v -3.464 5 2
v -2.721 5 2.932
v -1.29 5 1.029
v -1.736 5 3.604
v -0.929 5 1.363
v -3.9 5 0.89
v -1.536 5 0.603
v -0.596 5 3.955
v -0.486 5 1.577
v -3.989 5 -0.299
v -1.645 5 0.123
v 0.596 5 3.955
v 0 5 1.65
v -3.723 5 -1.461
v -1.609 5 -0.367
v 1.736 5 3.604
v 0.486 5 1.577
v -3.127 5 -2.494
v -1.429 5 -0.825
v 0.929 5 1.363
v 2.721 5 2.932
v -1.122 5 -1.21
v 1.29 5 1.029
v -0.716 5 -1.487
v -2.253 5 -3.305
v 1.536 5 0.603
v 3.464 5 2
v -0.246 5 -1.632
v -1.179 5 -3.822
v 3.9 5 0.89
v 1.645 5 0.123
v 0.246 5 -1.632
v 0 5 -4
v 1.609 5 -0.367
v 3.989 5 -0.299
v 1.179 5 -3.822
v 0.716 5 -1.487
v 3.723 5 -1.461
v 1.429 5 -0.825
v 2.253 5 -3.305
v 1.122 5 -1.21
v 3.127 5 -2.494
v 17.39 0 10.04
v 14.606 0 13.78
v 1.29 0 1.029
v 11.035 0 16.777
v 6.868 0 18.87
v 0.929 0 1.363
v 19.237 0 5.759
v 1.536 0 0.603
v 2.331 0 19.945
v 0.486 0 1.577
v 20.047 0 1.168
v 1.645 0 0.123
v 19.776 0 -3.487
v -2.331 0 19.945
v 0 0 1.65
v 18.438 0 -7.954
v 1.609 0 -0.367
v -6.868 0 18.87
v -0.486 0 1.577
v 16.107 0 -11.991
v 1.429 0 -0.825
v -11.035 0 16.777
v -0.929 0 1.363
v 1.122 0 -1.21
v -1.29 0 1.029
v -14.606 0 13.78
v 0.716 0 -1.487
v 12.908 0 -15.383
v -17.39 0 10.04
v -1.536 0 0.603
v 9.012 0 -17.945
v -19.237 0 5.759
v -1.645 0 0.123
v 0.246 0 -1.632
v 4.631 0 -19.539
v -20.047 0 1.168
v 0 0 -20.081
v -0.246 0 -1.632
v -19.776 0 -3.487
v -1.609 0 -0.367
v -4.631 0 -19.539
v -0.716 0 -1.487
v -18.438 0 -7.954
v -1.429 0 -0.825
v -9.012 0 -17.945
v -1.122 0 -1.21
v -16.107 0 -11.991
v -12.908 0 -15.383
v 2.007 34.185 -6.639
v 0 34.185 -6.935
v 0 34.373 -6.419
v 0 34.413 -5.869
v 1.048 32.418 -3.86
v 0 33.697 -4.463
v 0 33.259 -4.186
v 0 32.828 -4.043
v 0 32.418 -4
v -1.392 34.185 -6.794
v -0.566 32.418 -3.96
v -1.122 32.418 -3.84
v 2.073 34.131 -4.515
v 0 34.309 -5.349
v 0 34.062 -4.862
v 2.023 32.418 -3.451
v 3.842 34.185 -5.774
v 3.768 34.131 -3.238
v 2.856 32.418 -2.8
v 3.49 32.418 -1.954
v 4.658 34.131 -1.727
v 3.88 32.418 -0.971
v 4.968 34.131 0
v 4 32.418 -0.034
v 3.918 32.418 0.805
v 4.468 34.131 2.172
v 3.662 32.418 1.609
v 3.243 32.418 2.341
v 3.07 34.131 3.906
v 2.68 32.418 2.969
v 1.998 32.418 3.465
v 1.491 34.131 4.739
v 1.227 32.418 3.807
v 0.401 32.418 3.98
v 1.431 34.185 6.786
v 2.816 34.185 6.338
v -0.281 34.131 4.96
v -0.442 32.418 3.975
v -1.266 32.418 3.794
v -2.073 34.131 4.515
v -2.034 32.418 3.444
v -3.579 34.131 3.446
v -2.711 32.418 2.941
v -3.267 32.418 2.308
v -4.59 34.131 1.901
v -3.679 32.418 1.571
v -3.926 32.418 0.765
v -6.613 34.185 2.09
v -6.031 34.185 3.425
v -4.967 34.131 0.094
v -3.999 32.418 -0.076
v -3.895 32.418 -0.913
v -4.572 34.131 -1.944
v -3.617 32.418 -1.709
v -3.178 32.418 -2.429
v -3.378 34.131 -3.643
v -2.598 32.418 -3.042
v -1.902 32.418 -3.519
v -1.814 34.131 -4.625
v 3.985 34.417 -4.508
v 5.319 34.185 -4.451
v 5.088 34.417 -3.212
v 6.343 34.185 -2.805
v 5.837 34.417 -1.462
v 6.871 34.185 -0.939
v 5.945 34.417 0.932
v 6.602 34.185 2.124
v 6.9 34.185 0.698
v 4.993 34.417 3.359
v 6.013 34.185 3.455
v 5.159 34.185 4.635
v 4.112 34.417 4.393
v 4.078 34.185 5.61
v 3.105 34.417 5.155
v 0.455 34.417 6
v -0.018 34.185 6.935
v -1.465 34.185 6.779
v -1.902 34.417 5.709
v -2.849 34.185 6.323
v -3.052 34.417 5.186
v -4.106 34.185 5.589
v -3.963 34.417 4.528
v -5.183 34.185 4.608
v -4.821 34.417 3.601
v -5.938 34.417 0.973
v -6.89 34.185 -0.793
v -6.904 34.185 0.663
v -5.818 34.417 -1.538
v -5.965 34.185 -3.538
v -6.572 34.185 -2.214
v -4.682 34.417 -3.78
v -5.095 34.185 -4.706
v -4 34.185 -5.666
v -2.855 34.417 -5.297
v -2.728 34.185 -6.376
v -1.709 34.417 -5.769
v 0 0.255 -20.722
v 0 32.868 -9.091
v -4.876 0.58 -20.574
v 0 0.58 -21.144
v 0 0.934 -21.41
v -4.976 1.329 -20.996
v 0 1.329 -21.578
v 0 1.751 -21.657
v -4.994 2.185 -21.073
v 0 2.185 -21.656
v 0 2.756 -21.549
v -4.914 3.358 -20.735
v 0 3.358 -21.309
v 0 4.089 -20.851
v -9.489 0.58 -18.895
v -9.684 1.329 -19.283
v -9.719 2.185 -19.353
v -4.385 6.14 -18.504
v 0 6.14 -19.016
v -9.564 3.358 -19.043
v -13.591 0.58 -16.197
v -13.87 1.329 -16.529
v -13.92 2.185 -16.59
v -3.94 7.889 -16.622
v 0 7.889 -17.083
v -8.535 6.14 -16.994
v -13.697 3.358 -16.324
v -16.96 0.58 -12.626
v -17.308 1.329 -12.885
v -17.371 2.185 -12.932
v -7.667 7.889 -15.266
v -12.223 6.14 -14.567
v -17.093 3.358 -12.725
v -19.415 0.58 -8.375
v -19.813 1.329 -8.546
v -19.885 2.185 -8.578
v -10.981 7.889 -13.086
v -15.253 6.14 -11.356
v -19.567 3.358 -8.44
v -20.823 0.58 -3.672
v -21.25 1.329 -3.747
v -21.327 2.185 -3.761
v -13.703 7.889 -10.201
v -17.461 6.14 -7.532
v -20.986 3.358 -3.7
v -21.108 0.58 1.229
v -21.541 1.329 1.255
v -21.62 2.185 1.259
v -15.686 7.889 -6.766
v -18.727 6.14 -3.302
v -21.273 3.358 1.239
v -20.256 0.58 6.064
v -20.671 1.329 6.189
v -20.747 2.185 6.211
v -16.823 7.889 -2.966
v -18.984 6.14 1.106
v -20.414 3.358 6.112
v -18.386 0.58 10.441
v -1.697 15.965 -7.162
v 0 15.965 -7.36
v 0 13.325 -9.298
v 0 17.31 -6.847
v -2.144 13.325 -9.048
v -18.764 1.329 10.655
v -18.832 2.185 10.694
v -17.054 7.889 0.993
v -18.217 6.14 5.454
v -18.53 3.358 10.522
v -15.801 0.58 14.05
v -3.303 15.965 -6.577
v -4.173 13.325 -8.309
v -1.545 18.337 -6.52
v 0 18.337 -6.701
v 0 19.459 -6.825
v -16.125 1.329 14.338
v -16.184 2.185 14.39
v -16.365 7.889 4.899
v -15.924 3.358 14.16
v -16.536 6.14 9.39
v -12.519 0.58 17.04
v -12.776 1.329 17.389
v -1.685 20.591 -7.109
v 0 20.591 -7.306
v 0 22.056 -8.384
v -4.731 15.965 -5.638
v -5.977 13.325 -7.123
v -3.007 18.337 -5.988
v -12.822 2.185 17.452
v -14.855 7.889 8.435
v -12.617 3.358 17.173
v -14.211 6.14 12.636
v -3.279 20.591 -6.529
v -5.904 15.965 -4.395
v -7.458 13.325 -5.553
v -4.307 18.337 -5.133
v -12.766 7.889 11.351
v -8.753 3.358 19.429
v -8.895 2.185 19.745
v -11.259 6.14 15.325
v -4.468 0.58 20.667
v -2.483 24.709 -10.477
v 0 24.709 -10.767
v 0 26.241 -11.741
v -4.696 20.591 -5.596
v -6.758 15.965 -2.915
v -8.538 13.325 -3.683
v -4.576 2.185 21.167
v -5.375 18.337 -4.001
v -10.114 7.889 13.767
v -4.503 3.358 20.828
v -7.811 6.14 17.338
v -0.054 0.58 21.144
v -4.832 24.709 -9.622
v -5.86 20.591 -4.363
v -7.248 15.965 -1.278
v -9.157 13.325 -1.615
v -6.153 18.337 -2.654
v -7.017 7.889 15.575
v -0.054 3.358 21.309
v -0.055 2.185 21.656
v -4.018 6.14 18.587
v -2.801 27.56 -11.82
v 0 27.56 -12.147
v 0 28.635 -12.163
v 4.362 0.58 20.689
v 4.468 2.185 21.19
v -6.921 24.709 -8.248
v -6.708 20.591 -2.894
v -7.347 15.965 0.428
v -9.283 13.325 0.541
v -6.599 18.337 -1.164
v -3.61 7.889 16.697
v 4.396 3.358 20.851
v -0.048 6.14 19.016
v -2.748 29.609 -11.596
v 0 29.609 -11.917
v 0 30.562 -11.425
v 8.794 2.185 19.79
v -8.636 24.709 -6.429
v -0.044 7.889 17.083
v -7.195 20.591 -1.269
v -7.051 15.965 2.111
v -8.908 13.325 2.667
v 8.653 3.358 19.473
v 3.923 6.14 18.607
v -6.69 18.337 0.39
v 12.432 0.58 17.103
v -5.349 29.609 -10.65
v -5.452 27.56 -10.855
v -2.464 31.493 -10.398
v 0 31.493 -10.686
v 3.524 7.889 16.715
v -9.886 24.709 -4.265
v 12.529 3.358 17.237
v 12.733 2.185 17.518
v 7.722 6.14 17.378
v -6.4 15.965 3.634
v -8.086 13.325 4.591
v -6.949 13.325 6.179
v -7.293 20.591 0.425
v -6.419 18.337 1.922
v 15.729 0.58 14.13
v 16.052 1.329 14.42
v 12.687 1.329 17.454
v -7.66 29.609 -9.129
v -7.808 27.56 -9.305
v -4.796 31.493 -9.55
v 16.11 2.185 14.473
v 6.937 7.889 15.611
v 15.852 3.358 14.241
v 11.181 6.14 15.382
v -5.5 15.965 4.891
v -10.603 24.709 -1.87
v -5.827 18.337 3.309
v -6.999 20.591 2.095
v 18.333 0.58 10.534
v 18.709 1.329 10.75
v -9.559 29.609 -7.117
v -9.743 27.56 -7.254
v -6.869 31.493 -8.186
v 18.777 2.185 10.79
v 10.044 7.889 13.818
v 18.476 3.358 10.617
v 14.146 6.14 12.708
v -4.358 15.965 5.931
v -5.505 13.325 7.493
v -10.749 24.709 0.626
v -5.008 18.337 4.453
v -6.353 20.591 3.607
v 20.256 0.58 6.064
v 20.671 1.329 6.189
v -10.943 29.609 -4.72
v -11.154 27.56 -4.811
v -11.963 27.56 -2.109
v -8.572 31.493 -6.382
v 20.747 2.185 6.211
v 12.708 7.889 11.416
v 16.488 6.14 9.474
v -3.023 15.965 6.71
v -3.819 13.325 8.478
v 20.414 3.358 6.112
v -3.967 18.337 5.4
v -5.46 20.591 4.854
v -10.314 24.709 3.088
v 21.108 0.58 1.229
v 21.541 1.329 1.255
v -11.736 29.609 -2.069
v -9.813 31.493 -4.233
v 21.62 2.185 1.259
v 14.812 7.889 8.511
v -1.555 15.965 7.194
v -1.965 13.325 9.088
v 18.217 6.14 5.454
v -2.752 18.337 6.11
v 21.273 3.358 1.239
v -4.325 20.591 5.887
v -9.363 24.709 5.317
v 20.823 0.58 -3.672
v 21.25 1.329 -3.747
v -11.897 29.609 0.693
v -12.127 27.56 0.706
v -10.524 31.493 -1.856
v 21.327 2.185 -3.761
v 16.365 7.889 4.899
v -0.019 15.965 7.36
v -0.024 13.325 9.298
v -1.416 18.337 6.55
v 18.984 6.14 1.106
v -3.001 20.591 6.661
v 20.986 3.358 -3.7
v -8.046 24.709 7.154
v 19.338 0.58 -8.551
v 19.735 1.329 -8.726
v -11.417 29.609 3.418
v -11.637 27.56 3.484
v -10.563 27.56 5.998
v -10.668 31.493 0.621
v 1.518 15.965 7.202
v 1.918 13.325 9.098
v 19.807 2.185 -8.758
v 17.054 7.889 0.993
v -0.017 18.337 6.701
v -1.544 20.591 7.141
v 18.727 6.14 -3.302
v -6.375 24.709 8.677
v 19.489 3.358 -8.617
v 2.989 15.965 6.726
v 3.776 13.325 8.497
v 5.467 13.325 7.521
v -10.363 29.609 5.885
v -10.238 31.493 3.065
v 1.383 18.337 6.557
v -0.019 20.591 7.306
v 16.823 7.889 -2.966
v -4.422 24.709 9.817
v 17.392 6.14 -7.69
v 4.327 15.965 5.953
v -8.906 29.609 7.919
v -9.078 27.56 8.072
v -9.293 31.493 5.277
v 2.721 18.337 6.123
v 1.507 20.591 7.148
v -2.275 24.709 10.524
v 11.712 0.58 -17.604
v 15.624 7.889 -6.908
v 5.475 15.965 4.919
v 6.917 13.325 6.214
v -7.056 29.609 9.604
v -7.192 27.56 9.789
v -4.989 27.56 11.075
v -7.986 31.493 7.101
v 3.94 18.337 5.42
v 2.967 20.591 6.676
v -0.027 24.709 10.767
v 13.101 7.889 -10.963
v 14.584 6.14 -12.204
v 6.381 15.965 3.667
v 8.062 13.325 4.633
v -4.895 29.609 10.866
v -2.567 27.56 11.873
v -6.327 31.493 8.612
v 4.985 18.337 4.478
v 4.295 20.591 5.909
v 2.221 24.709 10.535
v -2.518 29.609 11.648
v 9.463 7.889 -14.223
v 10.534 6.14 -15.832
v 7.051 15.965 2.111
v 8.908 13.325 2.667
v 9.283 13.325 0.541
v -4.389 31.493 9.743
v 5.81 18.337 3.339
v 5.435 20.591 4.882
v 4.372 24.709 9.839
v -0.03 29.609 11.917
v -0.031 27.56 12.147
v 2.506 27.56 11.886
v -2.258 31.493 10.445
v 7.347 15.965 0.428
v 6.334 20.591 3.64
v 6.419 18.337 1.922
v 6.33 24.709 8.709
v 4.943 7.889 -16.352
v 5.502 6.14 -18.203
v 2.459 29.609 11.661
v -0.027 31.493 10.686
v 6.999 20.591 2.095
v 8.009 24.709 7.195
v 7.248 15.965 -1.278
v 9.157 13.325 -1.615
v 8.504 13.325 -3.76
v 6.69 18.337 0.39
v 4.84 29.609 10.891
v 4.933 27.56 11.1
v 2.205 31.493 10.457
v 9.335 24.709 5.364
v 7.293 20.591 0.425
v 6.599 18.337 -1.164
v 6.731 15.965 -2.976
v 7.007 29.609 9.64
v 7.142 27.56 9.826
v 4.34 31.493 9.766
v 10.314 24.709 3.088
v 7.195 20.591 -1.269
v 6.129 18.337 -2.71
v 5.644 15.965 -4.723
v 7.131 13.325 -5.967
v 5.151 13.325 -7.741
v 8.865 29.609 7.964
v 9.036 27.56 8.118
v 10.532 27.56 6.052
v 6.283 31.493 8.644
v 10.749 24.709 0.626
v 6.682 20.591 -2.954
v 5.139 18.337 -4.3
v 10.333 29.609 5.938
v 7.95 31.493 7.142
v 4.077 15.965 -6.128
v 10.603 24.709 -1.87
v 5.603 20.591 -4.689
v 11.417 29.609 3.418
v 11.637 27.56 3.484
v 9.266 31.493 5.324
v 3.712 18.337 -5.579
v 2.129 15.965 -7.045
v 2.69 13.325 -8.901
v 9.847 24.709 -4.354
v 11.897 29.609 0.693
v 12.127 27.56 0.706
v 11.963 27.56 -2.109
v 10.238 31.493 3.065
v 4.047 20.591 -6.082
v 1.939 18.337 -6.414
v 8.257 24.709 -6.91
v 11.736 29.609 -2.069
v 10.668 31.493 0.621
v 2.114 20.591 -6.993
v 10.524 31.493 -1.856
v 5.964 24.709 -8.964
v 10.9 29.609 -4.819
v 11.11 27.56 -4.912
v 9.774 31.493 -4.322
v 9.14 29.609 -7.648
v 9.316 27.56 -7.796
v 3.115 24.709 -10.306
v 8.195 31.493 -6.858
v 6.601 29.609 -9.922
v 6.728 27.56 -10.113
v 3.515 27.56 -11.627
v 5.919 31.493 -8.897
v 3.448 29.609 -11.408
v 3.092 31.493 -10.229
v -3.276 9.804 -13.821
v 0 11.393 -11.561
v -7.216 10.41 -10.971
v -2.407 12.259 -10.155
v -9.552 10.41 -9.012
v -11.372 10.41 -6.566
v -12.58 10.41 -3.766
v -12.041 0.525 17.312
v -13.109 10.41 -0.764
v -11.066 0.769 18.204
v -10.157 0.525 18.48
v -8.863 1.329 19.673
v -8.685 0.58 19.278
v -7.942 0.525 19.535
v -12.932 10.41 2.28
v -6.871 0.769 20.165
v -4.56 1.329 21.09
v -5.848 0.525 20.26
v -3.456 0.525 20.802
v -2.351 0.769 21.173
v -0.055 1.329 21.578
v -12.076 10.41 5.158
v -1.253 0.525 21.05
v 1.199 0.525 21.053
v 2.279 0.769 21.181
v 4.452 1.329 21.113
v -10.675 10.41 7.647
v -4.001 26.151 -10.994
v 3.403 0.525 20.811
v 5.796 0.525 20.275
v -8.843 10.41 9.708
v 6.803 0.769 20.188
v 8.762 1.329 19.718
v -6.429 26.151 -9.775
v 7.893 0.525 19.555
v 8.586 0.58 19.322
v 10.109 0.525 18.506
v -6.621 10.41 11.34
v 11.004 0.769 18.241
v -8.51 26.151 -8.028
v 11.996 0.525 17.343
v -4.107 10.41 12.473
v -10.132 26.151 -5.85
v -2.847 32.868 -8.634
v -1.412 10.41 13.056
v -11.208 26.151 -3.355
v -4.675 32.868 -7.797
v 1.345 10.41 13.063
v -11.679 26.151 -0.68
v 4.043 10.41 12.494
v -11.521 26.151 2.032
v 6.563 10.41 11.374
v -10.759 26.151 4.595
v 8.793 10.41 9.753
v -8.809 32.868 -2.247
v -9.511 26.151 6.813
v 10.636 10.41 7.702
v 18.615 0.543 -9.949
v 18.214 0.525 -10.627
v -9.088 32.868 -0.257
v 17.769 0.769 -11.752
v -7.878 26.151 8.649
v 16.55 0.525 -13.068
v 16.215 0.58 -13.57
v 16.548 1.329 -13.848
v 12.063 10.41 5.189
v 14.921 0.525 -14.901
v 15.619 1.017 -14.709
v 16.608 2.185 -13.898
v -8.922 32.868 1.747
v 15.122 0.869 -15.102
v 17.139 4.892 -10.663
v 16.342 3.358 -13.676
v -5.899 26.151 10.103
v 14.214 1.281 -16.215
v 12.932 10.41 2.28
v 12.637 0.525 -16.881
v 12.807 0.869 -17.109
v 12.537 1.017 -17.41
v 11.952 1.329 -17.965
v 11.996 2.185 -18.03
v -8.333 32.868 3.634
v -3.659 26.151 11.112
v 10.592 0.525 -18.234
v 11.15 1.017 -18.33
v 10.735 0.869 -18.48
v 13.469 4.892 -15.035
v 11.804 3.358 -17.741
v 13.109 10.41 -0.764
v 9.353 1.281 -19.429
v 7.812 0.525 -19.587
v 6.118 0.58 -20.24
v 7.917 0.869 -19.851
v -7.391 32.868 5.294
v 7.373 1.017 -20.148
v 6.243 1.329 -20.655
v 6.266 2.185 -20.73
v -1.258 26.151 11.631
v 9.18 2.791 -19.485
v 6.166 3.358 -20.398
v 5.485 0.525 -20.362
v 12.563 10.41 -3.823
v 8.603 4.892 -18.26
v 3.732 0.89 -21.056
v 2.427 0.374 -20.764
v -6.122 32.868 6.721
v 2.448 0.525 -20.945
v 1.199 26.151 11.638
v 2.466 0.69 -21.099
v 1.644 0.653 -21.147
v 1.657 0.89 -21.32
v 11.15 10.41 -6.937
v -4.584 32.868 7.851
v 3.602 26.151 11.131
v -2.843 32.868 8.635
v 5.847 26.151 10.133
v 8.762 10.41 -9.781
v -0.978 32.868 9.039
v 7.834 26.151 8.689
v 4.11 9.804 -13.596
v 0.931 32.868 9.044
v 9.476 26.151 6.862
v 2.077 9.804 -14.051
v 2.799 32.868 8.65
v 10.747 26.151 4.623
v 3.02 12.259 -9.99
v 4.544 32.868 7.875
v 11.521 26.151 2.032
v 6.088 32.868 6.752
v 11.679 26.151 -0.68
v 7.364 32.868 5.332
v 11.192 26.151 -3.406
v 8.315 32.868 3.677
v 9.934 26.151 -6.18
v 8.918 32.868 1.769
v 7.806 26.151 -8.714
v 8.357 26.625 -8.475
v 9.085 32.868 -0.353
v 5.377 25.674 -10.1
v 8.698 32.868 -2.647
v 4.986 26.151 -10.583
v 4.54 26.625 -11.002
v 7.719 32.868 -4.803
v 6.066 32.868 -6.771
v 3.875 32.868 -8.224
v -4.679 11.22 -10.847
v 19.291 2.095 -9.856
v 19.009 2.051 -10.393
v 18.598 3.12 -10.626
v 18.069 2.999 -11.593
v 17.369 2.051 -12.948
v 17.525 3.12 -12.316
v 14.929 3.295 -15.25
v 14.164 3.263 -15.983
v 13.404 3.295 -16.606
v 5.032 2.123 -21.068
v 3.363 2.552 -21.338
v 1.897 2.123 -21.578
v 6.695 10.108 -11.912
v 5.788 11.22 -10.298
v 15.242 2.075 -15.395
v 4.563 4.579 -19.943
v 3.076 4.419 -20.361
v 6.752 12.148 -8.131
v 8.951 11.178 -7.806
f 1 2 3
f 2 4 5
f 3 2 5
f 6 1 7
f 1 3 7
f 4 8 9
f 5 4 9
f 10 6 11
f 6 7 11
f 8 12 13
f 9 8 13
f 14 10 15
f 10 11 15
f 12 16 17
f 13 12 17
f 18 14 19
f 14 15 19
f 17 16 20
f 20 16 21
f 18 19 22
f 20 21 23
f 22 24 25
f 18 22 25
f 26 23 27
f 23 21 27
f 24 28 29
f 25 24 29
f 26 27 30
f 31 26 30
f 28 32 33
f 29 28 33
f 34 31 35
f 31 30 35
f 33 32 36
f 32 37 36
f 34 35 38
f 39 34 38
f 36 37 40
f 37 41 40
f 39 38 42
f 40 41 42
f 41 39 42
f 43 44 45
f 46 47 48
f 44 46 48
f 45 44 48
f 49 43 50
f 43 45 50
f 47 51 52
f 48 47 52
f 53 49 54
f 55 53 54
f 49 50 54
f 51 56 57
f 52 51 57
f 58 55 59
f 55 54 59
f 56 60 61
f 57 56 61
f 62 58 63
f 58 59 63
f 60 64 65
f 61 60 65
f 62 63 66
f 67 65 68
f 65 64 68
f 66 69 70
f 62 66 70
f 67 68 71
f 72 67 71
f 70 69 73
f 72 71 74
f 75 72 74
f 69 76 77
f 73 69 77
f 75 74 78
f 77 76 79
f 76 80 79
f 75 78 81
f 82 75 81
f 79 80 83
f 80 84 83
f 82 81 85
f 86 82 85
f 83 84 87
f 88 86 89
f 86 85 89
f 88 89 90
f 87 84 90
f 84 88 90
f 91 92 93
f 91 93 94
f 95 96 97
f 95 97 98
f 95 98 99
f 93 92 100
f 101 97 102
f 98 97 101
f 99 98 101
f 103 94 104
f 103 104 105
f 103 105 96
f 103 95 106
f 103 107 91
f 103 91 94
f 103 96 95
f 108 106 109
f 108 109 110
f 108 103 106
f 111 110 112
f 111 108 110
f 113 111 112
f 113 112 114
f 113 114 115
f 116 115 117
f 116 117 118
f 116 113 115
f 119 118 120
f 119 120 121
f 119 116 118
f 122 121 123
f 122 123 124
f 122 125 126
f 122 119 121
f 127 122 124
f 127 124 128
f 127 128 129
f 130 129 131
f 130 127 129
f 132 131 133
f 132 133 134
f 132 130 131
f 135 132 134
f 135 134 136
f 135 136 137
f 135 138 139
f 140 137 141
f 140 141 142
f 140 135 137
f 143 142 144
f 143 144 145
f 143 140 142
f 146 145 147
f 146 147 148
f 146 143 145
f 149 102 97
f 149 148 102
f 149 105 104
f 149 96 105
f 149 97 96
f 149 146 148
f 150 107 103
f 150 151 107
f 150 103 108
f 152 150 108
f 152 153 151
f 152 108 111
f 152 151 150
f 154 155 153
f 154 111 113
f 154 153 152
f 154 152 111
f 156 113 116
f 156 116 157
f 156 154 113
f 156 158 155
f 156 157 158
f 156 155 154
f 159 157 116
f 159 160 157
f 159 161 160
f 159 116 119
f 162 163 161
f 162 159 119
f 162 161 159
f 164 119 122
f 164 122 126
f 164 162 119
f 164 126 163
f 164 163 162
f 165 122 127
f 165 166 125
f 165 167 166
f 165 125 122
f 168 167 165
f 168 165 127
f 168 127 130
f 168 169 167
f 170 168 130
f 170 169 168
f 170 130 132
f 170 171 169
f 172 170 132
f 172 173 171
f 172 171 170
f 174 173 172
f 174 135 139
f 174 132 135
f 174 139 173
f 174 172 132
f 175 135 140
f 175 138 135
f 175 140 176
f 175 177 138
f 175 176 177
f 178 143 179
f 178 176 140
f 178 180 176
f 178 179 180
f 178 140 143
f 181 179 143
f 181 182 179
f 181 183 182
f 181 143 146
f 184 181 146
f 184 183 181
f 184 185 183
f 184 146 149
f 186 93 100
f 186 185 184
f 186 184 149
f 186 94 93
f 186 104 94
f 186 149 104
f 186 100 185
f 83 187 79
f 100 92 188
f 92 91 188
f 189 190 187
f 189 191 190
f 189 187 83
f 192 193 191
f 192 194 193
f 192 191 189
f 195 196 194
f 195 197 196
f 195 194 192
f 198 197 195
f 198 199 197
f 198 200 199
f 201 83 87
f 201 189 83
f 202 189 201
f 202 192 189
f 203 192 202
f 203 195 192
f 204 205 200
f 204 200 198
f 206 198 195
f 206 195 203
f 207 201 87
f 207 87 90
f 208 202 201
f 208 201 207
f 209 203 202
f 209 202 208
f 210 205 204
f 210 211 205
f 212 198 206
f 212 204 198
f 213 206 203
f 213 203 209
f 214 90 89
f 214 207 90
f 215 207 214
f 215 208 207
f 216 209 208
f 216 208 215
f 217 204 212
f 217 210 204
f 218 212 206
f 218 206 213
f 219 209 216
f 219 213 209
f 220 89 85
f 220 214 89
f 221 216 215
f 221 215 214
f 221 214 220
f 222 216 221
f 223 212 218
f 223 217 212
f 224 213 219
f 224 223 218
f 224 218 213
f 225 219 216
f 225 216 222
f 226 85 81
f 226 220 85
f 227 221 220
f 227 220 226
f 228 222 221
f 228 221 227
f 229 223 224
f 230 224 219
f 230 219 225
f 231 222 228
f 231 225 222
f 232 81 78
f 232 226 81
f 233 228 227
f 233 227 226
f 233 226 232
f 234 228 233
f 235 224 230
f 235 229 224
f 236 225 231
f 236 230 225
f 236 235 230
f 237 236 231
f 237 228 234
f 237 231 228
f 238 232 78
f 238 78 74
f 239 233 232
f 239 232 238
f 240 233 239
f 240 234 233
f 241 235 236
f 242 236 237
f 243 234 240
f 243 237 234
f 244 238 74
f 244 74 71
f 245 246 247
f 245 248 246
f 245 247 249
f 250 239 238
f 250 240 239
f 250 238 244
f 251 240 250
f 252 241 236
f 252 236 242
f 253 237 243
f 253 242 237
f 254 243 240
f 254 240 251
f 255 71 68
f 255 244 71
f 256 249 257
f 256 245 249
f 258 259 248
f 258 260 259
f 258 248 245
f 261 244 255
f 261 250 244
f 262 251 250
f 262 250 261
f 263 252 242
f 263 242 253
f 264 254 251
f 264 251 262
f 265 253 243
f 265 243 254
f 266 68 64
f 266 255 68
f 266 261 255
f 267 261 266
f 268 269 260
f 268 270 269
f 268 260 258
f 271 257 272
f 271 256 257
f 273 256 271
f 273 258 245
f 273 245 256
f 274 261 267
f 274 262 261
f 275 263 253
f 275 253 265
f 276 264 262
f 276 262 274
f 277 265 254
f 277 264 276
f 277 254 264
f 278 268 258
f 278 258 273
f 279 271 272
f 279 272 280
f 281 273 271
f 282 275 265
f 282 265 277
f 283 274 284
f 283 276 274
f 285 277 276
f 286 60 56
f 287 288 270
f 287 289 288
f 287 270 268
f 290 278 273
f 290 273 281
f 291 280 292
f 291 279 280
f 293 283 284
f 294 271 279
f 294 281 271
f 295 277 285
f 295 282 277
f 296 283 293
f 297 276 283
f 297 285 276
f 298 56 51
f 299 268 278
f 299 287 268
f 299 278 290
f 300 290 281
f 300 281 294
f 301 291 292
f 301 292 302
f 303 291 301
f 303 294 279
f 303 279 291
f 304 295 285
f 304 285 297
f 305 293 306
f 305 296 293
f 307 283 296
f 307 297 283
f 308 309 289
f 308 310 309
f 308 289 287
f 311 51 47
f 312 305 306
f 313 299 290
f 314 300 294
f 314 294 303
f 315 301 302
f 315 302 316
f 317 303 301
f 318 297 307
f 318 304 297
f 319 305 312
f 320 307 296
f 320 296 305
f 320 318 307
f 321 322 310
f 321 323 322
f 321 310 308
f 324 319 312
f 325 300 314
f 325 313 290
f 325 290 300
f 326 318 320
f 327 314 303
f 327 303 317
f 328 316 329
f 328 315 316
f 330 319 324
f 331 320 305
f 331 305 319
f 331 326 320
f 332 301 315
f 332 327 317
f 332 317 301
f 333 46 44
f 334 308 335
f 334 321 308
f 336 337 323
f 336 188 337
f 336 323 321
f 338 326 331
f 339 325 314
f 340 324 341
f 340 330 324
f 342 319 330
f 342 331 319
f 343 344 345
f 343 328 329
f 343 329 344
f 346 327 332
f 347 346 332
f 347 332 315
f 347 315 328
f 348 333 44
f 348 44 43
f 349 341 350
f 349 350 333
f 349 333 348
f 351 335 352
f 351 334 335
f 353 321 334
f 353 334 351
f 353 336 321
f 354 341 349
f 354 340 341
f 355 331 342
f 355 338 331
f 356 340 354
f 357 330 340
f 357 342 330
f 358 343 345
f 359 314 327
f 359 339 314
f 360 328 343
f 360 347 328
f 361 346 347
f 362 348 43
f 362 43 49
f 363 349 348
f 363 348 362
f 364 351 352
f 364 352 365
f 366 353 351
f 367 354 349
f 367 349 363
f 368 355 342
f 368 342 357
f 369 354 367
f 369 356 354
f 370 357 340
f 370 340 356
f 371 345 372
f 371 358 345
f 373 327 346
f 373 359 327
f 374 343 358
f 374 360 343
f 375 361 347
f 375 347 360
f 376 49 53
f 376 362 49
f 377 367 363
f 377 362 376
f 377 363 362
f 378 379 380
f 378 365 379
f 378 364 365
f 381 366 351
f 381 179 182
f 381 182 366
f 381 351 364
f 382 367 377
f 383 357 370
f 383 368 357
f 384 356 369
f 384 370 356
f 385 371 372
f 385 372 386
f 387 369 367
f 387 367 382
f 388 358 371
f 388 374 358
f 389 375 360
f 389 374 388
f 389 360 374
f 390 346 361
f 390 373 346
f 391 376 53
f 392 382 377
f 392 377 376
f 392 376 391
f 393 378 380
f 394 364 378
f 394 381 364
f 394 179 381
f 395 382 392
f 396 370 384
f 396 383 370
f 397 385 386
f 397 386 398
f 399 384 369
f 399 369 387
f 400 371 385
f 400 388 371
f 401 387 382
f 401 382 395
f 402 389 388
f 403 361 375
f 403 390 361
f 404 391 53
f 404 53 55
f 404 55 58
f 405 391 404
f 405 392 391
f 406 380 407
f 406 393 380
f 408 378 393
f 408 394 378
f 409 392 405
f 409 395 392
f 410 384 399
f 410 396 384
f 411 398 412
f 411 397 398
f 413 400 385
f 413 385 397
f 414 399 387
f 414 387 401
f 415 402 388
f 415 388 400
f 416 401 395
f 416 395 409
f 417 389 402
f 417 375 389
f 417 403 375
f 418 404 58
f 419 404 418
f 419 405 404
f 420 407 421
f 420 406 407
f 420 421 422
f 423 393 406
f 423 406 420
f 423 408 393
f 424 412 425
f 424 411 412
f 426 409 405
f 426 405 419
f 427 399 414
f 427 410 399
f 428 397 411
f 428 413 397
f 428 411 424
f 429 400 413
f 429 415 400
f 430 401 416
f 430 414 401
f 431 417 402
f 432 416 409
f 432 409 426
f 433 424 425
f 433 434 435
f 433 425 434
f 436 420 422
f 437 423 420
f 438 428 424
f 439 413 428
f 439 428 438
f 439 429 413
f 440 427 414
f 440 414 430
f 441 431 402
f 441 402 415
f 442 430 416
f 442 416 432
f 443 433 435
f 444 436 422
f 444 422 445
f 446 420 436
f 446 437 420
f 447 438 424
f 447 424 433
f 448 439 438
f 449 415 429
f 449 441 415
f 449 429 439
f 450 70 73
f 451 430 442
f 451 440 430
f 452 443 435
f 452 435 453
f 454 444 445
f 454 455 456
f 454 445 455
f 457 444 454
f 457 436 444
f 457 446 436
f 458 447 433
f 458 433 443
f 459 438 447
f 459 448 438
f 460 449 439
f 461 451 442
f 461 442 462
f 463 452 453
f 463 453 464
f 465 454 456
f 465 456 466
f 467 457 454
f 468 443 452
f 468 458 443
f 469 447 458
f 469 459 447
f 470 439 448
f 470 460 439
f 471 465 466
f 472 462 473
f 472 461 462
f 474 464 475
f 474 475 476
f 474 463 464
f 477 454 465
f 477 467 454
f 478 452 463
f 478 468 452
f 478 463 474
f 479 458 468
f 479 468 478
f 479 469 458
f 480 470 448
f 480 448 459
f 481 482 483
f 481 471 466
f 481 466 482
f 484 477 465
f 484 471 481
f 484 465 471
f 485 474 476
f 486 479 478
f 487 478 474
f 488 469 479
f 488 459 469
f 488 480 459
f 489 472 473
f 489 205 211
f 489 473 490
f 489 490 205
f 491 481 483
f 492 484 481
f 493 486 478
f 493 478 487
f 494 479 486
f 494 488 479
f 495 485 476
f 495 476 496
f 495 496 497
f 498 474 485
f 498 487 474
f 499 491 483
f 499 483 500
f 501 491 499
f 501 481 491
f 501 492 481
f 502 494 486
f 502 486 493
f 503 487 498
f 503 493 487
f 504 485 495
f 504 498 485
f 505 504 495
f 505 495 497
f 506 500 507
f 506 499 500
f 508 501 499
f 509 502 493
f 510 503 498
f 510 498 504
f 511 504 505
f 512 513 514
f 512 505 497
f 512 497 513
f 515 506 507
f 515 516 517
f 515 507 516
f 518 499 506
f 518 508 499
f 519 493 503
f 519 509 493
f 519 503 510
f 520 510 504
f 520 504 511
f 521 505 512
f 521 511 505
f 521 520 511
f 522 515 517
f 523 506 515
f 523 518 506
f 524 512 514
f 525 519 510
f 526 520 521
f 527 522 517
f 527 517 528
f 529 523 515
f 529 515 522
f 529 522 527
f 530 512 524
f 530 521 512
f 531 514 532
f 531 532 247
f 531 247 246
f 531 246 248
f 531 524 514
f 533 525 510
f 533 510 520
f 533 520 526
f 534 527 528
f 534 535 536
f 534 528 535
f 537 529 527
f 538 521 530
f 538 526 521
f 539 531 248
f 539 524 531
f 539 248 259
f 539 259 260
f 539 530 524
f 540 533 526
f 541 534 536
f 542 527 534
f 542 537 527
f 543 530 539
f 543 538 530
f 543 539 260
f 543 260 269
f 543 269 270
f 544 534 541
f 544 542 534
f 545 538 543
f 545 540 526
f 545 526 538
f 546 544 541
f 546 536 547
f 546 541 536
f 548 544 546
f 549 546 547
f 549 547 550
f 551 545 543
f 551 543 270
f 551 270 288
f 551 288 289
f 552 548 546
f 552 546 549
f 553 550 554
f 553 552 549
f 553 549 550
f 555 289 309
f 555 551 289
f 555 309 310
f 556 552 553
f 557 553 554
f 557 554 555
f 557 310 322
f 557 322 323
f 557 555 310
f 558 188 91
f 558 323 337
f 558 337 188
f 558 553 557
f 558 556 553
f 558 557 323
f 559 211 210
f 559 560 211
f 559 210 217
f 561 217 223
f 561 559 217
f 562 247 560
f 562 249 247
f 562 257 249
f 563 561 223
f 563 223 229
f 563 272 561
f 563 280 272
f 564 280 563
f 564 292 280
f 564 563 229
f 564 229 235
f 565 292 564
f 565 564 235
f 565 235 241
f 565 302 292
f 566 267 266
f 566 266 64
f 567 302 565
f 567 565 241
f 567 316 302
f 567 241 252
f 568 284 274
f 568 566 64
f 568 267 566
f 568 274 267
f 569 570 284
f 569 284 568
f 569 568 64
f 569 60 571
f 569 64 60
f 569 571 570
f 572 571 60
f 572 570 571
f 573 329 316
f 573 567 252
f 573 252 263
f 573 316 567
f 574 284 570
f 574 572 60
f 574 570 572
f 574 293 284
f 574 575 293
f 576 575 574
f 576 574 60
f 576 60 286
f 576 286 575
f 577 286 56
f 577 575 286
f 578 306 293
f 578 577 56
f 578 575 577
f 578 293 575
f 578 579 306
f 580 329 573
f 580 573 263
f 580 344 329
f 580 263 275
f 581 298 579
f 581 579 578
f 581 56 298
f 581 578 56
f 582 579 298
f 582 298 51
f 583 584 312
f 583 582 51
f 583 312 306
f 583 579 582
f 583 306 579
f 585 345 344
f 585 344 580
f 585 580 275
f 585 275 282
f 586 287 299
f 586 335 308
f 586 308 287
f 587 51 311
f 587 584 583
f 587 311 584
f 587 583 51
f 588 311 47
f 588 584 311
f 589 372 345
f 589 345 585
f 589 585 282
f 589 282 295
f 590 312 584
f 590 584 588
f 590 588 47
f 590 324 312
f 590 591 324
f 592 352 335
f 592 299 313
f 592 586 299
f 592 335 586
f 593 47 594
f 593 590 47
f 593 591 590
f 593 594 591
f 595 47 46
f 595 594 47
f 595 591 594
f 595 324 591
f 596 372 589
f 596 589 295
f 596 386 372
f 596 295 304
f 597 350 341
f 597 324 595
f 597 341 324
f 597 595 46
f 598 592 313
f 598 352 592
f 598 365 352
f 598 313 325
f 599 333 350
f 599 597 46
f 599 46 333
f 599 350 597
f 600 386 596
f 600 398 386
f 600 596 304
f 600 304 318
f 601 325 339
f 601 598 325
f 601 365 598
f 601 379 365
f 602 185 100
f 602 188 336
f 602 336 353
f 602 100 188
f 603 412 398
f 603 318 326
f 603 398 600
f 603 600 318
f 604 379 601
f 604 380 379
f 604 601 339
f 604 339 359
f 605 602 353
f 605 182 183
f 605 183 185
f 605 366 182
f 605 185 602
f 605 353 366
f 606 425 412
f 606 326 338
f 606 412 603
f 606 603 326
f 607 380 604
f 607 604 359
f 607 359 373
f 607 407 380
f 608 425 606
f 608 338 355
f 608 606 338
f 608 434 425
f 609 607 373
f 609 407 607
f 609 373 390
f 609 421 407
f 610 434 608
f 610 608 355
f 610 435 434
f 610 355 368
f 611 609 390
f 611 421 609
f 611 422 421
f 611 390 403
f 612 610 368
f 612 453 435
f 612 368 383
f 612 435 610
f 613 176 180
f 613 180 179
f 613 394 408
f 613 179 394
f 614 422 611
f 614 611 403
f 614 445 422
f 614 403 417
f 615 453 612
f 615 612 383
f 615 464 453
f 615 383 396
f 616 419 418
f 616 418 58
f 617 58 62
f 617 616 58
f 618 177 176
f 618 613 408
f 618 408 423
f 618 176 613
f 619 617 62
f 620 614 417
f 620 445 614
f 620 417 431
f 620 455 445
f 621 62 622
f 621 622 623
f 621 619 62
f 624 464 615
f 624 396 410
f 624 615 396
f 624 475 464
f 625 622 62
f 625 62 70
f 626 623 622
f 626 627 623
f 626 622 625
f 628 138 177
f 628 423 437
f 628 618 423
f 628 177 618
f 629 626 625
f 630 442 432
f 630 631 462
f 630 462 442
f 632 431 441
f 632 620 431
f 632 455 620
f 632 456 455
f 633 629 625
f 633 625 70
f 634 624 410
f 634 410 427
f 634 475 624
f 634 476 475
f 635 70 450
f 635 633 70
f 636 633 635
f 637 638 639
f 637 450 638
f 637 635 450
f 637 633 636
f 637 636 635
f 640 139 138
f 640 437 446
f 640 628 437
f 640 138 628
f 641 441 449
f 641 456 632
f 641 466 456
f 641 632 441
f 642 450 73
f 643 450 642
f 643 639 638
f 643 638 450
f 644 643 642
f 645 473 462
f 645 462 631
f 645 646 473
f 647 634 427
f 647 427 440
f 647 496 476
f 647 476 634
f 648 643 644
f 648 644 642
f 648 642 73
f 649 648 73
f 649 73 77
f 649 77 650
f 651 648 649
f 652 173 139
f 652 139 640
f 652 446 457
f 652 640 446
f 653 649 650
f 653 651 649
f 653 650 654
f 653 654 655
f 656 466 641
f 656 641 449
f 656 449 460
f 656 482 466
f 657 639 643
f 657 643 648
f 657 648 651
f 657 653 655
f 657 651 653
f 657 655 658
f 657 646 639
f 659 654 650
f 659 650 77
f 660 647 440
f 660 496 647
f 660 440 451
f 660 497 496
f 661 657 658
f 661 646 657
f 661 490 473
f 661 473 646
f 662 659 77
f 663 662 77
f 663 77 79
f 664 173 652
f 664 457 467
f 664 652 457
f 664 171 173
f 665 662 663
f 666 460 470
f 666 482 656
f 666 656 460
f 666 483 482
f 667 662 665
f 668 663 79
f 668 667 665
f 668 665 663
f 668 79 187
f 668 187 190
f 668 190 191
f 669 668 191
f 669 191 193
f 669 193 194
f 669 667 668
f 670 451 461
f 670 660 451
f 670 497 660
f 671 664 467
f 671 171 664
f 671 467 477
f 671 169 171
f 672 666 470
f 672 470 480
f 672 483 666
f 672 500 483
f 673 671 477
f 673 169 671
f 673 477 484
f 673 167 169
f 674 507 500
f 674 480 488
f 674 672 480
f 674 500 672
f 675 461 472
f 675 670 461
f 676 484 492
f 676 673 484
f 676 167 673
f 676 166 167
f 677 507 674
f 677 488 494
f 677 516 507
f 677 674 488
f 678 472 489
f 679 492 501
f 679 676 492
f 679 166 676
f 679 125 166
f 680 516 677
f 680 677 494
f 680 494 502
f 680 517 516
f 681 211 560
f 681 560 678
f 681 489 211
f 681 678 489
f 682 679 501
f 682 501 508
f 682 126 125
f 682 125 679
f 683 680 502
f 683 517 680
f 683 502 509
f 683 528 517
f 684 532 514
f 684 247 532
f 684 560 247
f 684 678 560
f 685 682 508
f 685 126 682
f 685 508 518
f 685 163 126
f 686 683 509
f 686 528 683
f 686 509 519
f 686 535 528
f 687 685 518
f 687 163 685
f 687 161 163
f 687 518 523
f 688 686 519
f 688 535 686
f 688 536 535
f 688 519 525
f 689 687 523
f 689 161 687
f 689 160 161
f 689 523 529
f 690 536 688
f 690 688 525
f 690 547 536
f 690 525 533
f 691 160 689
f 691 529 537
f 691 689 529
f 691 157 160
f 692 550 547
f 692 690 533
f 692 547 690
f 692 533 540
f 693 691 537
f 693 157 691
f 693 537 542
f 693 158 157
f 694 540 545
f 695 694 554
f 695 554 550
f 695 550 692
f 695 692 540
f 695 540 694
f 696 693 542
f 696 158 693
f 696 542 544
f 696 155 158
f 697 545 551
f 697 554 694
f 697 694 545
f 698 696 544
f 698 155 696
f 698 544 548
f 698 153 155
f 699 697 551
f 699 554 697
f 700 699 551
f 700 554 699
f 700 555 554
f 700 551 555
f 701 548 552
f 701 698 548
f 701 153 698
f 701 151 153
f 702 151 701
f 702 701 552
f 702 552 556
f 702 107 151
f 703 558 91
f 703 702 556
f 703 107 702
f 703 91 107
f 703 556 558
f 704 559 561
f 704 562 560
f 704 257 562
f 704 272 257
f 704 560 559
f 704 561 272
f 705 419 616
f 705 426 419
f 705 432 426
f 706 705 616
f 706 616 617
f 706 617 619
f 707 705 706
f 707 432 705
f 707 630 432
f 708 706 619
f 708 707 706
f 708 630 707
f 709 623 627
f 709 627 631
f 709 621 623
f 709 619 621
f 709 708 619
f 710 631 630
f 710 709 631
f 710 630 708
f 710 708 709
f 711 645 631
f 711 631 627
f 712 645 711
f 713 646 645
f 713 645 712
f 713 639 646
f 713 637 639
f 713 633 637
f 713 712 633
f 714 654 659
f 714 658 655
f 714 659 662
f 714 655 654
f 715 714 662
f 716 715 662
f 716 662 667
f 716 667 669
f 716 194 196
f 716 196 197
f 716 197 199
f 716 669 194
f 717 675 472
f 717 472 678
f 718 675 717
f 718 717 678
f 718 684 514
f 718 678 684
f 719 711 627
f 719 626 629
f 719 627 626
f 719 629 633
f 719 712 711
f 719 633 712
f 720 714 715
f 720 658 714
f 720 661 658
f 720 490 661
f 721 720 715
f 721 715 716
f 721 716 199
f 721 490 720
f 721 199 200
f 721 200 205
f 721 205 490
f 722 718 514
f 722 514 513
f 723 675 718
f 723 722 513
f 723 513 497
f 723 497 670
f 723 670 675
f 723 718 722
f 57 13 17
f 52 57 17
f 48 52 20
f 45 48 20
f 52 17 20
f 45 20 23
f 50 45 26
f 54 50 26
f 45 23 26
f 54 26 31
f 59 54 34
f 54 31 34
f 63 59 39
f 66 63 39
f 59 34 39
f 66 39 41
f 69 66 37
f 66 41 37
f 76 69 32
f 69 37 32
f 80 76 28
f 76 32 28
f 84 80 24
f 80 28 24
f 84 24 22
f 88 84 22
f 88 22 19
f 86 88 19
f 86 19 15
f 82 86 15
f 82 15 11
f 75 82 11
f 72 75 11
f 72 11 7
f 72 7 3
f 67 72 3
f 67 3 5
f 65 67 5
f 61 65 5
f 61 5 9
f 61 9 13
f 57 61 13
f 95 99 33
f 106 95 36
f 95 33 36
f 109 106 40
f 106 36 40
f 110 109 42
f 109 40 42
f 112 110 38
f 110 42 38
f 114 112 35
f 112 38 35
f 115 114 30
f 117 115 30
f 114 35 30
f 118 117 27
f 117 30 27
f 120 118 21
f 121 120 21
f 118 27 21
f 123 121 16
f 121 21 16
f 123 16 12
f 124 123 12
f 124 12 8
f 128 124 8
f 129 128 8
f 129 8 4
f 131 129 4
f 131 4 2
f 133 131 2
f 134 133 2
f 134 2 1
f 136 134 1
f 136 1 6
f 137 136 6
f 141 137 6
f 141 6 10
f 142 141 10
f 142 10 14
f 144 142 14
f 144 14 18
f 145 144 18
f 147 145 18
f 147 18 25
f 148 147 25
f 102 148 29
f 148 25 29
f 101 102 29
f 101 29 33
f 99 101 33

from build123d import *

# Parameters (mm, degrees)
SKETCH_3_R          = 4
CUT_EXTRUDE_1_DEPTH = 45.263110341
SKETCH_4_R          = 1.65
CUT_EXTRUDE_2_DEPTH = 44.256539845
FILLET_1_R          = 2


with BuildPart() as part:
    # 草图2 → 旋转1 (revolve)
    with BuildSketch(Plane(origin=(0, 0, 0), x_dir=(0, 0, -1), z_dir=(1, 0, 0))):
        with BuildLine():
            Line((0, 0), (0, 36.9438678))
            add(Edge.make_bspline(
                [(20.080767887, 0), (21.61992217, 0.396173772), (22.048203388, 2.702962278), (16.318399942, 9.554519138), (12.012534144, 9.668097732), (4.136478654, 18.908564942), (15.786716848, 28.108159005), (10.505835273, 33.681074023), (0, 36.9438678)],
                knots=[0, 0, 0, 0, 0.042121549, 0.074302995, 0.321814466, 0.52443649, 0.650070141, 1, 1, 1, 1], degree=3))
            Line((20.080767887, 0), (0, 0))
        make_face()
    revolve(axis=Axis((0, 0, 0), (0, 1, 0)))

    # 草图3 → 切除-拉伸1 (cut, through all)
    with BuildSketch(Plane(origin=(0, 5, 0), x_dir=(-1, 0, 0), z_dir=(0, -1, 0))):
        with Locations(Location((0, 0, 0), (0, 0, 90))):
            Circle(SKETCH_3_R)
    extrude(amount=-CUT_EXTRUDE_1_DEPTH, mode=Mode.SUBTRACT)

    # 草图4 → 切除-拉伸2 (cut, through all)
    with BuildSketch(Plane(origin=(0, 5, 0), x_dir=(1, 0, 0), z_dir=(0, 1, 0))):
        with Locations(Location((0, 0, 0), (0, 0, 270))):
            Circle(SKETCH_4_R)
    extrude(amount=-CUT_EXTRUDE_2_DEPTH, mode=Mode.SUBTRACT)

    # 圆角1
    fillet_1_edges = [part.edges().sort_by_distance(p)[0] for p in [
        (1e-09, 35.533849947, 4),
    ]]
    fillet(fillet_1_edges, radius=FILLET_1_R)


solid = part.part
